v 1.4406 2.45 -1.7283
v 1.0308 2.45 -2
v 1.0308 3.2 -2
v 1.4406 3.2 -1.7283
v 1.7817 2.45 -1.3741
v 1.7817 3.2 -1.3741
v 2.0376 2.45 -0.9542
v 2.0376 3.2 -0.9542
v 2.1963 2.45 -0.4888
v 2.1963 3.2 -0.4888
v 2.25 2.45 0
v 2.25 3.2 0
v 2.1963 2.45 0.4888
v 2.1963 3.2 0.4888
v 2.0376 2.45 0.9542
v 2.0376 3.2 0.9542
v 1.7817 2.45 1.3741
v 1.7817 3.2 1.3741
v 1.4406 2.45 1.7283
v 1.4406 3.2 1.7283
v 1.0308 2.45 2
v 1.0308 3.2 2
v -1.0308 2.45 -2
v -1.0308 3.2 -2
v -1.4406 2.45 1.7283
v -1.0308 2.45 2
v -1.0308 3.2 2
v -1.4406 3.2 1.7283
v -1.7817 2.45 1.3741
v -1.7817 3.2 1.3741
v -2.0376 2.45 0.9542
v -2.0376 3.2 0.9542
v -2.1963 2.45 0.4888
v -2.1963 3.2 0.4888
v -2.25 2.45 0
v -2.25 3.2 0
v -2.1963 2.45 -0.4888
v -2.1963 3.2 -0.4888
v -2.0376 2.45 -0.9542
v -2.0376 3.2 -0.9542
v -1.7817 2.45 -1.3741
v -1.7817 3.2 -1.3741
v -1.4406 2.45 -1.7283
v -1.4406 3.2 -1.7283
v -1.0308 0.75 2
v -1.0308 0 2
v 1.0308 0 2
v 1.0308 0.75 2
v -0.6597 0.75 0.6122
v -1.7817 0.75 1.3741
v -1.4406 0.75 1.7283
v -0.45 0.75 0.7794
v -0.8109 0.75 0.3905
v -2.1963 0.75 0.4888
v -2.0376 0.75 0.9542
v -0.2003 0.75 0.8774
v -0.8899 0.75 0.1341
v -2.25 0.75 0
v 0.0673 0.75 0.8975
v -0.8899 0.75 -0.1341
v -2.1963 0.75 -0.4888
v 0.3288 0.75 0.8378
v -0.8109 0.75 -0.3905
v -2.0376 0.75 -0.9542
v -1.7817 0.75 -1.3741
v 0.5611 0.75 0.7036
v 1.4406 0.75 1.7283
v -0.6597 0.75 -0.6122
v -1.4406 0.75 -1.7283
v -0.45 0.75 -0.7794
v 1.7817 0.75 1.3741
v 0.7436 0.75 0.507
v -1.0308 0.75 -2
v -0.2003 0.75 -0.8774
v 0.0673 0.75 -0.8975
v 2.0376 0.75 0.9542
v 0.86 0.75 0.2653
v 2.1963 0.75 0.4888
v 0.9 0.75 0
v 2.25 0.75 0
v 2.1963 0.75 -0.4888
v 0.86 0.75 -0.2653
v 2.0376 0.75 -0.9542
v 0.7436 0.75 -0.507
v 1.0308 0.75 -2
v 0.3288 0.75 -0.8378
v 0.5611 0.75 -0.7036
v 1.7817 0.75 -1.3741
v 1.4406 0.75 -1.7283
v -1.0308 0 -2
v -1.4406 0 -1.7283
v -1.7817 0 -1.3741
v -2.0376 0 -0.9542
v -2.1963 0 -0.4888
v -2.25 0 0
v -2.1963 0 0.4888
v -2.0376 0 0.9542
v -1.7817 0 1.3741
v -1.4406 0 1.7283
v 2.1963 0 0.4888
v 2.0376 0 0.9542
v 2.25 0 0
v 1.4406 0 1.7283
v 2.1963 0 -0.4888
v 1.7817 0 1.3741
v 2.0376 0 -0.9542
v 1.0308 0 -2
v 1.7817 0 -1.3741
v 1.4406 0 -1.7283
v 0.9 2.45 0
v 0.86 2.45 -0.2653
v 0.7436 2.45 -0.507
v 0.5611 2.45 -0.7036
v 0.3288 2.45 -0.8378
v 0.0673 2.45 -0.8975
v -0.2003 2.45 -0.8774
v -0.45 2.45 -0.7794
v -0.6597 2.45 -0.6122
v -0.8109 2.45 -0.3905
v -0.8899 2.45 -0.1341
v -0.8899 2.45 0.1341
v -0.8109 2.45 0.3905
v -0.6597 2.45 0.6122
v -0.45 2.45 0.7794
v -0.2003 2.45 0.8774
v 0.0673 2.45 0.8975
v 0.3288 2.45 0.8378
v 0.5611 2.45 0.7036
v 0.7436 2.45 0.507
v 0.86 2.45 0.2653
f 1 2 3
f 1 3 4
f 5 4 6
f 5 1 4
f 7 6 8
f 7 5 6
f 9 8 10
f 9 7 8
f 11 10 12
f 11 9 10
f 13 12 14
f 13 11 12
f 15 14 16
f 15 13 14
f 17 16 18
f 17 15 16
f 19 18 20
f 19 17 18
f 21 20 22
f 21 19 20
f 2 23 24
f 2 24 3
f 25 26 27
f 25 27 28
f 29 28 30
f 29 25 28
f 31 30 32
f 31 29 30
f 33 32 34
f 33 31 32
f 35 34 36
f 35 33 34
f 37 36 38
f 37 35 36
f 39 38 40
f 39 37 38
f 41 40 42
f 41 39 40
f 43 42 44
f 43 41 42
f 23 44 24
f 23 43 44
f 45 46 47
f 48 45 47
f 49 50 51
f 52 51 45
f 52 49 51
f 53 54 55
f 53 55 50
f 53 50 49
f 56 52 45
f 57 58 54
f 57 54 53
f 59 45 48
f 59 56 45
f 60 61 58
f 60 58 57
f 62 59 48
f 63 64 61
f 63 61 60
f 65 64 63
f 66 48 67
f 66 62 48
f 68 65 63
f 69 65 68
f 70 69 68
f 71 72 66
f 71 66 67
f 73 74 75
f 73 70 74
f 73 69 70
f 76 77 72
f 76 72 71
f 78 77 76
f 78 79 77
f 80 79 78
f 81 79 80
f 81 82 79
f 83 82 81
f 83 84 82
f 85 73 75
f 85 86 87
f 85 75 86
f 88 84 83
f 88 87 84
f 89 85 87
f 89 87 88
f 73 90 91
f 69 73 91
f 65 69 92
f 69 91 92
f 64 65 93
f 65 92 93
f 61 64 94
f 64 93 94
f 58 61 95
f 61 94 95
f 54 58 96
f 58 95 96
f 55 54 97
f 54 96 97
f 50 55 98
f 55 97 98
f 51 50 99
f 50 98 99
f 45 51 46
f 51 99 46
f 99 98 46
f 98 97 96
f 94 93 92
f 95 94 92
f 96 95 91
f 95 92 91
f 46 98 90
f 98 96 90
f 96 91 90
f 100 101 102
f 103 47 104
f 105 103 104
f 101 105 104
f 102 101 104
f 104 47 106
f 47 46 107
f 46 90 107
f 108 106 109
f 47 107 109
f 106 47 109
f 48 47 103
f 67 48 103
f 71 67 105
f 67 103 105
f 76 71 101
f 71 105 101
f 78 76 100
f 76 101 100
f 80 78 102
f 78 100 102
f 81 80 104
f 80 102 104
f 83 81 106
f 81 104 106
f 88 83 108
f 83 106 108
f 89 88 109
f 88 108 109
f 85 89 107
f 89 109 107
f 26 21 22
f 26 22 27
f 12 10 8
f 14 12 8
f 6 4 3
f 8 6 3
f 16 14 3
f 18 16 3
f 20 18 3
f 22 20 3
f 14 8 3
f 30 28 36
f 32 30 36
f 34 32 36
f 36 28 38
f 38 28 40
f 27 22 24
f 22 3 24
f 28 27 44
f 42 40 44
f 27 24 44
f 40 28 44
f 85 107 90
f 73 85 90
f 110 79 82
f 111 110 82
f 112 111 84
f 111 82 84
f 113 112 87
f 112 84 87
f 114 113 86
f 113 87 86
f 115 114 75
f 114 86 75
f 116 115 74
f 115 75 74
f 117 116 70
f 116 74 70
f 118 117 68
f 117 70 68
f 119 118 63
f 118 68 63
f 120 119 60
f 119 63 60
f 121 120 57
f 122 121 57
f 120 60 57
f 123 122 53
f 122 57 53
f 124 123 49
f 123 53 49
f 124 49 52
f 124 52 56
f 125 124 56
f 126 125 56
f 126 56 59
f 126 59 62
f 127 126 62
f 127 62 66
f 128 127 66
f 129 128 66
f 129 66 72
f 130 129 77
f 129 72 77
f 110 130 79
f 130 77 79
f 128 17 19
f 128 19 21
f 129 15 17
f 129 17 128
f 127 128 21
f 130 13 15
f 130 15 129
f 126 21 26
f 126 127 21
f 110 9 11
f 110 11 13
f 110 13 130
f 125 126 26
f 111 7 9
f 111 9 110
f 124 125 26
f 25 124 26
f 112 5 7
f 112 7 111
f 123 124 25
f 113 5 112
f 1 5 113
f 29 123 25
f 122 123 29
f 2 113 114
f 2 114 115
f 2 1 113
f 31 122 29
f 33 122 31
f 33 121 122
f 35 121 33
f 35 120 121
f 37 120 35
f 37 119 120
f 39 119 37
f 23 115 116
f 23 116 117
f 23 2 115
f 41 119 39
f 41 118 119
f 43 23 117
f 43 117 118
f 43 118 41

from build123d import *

# Parameters (mm, degrees)
BOSS_EXTRUDE1_DEPTH = 0.75
SKETCH2_R           = 0.9
BOSS_EXTRUDE2_DEPTH = 1.7
BOSS_EXTRUDE3_DEPTH = 0.75


with BuildPart() as part:
    # Sketch1 → Boss-Extrude1 (new body)
    with BuildSketch(Plane(origin=(0, 0, 0), x_dir=(1, 0, 0), z_dir=(0, 1, 0))):
        with BuildLine():
            Line((-1.030776406, -2), (1.030776406, -2))
            ThreePointArc((1.030776406, -2), (2.25, 0), (1.030776406, 2))
            Line((1.030776406, 2), (-1.030776406, 2))
            ThreePointArc((-1.030776406, 2), (-2.25, 0), (-1.030776406, -2))
        make_face()
    extrude(amount=BOSS_EXTRUDE1_DEPTH)

    # Sketch2 → Boss-Extrude2 (add)
    with BuildSketch(Plane(origin=(0, 0.75, 0), x_dir=(1, 0, 0), z_dir=(0, 1, 0))):
        Circle(SKETCH2_R)
    extrude(amount=BOSS_EXTRUDE2_DEPTH)

    # Sketch3 → Boss-Extrude3 (add)
    with BuildSketch(Plane(origin=(0, 2.45, 0), x_dir=(1, 0, 0), z_dir=(0, 1, 0))):
        with BuildLine():
            Line((-1.030776406, 2), (1.030776406, 2))
            ThreePointArc((1.030776406, 2), (2.25, 0), (1.030776406, -2))
            Line((1.030776406, -2), (-1.030776406, -2))
            ThreePointArc((-1.030776406, -2), (-2.25, 0), (-1.030776406, 2))
        make_face()
    extrude(amount=BOSS_EXTRUDE3_DEPTH)


solid = part.part
